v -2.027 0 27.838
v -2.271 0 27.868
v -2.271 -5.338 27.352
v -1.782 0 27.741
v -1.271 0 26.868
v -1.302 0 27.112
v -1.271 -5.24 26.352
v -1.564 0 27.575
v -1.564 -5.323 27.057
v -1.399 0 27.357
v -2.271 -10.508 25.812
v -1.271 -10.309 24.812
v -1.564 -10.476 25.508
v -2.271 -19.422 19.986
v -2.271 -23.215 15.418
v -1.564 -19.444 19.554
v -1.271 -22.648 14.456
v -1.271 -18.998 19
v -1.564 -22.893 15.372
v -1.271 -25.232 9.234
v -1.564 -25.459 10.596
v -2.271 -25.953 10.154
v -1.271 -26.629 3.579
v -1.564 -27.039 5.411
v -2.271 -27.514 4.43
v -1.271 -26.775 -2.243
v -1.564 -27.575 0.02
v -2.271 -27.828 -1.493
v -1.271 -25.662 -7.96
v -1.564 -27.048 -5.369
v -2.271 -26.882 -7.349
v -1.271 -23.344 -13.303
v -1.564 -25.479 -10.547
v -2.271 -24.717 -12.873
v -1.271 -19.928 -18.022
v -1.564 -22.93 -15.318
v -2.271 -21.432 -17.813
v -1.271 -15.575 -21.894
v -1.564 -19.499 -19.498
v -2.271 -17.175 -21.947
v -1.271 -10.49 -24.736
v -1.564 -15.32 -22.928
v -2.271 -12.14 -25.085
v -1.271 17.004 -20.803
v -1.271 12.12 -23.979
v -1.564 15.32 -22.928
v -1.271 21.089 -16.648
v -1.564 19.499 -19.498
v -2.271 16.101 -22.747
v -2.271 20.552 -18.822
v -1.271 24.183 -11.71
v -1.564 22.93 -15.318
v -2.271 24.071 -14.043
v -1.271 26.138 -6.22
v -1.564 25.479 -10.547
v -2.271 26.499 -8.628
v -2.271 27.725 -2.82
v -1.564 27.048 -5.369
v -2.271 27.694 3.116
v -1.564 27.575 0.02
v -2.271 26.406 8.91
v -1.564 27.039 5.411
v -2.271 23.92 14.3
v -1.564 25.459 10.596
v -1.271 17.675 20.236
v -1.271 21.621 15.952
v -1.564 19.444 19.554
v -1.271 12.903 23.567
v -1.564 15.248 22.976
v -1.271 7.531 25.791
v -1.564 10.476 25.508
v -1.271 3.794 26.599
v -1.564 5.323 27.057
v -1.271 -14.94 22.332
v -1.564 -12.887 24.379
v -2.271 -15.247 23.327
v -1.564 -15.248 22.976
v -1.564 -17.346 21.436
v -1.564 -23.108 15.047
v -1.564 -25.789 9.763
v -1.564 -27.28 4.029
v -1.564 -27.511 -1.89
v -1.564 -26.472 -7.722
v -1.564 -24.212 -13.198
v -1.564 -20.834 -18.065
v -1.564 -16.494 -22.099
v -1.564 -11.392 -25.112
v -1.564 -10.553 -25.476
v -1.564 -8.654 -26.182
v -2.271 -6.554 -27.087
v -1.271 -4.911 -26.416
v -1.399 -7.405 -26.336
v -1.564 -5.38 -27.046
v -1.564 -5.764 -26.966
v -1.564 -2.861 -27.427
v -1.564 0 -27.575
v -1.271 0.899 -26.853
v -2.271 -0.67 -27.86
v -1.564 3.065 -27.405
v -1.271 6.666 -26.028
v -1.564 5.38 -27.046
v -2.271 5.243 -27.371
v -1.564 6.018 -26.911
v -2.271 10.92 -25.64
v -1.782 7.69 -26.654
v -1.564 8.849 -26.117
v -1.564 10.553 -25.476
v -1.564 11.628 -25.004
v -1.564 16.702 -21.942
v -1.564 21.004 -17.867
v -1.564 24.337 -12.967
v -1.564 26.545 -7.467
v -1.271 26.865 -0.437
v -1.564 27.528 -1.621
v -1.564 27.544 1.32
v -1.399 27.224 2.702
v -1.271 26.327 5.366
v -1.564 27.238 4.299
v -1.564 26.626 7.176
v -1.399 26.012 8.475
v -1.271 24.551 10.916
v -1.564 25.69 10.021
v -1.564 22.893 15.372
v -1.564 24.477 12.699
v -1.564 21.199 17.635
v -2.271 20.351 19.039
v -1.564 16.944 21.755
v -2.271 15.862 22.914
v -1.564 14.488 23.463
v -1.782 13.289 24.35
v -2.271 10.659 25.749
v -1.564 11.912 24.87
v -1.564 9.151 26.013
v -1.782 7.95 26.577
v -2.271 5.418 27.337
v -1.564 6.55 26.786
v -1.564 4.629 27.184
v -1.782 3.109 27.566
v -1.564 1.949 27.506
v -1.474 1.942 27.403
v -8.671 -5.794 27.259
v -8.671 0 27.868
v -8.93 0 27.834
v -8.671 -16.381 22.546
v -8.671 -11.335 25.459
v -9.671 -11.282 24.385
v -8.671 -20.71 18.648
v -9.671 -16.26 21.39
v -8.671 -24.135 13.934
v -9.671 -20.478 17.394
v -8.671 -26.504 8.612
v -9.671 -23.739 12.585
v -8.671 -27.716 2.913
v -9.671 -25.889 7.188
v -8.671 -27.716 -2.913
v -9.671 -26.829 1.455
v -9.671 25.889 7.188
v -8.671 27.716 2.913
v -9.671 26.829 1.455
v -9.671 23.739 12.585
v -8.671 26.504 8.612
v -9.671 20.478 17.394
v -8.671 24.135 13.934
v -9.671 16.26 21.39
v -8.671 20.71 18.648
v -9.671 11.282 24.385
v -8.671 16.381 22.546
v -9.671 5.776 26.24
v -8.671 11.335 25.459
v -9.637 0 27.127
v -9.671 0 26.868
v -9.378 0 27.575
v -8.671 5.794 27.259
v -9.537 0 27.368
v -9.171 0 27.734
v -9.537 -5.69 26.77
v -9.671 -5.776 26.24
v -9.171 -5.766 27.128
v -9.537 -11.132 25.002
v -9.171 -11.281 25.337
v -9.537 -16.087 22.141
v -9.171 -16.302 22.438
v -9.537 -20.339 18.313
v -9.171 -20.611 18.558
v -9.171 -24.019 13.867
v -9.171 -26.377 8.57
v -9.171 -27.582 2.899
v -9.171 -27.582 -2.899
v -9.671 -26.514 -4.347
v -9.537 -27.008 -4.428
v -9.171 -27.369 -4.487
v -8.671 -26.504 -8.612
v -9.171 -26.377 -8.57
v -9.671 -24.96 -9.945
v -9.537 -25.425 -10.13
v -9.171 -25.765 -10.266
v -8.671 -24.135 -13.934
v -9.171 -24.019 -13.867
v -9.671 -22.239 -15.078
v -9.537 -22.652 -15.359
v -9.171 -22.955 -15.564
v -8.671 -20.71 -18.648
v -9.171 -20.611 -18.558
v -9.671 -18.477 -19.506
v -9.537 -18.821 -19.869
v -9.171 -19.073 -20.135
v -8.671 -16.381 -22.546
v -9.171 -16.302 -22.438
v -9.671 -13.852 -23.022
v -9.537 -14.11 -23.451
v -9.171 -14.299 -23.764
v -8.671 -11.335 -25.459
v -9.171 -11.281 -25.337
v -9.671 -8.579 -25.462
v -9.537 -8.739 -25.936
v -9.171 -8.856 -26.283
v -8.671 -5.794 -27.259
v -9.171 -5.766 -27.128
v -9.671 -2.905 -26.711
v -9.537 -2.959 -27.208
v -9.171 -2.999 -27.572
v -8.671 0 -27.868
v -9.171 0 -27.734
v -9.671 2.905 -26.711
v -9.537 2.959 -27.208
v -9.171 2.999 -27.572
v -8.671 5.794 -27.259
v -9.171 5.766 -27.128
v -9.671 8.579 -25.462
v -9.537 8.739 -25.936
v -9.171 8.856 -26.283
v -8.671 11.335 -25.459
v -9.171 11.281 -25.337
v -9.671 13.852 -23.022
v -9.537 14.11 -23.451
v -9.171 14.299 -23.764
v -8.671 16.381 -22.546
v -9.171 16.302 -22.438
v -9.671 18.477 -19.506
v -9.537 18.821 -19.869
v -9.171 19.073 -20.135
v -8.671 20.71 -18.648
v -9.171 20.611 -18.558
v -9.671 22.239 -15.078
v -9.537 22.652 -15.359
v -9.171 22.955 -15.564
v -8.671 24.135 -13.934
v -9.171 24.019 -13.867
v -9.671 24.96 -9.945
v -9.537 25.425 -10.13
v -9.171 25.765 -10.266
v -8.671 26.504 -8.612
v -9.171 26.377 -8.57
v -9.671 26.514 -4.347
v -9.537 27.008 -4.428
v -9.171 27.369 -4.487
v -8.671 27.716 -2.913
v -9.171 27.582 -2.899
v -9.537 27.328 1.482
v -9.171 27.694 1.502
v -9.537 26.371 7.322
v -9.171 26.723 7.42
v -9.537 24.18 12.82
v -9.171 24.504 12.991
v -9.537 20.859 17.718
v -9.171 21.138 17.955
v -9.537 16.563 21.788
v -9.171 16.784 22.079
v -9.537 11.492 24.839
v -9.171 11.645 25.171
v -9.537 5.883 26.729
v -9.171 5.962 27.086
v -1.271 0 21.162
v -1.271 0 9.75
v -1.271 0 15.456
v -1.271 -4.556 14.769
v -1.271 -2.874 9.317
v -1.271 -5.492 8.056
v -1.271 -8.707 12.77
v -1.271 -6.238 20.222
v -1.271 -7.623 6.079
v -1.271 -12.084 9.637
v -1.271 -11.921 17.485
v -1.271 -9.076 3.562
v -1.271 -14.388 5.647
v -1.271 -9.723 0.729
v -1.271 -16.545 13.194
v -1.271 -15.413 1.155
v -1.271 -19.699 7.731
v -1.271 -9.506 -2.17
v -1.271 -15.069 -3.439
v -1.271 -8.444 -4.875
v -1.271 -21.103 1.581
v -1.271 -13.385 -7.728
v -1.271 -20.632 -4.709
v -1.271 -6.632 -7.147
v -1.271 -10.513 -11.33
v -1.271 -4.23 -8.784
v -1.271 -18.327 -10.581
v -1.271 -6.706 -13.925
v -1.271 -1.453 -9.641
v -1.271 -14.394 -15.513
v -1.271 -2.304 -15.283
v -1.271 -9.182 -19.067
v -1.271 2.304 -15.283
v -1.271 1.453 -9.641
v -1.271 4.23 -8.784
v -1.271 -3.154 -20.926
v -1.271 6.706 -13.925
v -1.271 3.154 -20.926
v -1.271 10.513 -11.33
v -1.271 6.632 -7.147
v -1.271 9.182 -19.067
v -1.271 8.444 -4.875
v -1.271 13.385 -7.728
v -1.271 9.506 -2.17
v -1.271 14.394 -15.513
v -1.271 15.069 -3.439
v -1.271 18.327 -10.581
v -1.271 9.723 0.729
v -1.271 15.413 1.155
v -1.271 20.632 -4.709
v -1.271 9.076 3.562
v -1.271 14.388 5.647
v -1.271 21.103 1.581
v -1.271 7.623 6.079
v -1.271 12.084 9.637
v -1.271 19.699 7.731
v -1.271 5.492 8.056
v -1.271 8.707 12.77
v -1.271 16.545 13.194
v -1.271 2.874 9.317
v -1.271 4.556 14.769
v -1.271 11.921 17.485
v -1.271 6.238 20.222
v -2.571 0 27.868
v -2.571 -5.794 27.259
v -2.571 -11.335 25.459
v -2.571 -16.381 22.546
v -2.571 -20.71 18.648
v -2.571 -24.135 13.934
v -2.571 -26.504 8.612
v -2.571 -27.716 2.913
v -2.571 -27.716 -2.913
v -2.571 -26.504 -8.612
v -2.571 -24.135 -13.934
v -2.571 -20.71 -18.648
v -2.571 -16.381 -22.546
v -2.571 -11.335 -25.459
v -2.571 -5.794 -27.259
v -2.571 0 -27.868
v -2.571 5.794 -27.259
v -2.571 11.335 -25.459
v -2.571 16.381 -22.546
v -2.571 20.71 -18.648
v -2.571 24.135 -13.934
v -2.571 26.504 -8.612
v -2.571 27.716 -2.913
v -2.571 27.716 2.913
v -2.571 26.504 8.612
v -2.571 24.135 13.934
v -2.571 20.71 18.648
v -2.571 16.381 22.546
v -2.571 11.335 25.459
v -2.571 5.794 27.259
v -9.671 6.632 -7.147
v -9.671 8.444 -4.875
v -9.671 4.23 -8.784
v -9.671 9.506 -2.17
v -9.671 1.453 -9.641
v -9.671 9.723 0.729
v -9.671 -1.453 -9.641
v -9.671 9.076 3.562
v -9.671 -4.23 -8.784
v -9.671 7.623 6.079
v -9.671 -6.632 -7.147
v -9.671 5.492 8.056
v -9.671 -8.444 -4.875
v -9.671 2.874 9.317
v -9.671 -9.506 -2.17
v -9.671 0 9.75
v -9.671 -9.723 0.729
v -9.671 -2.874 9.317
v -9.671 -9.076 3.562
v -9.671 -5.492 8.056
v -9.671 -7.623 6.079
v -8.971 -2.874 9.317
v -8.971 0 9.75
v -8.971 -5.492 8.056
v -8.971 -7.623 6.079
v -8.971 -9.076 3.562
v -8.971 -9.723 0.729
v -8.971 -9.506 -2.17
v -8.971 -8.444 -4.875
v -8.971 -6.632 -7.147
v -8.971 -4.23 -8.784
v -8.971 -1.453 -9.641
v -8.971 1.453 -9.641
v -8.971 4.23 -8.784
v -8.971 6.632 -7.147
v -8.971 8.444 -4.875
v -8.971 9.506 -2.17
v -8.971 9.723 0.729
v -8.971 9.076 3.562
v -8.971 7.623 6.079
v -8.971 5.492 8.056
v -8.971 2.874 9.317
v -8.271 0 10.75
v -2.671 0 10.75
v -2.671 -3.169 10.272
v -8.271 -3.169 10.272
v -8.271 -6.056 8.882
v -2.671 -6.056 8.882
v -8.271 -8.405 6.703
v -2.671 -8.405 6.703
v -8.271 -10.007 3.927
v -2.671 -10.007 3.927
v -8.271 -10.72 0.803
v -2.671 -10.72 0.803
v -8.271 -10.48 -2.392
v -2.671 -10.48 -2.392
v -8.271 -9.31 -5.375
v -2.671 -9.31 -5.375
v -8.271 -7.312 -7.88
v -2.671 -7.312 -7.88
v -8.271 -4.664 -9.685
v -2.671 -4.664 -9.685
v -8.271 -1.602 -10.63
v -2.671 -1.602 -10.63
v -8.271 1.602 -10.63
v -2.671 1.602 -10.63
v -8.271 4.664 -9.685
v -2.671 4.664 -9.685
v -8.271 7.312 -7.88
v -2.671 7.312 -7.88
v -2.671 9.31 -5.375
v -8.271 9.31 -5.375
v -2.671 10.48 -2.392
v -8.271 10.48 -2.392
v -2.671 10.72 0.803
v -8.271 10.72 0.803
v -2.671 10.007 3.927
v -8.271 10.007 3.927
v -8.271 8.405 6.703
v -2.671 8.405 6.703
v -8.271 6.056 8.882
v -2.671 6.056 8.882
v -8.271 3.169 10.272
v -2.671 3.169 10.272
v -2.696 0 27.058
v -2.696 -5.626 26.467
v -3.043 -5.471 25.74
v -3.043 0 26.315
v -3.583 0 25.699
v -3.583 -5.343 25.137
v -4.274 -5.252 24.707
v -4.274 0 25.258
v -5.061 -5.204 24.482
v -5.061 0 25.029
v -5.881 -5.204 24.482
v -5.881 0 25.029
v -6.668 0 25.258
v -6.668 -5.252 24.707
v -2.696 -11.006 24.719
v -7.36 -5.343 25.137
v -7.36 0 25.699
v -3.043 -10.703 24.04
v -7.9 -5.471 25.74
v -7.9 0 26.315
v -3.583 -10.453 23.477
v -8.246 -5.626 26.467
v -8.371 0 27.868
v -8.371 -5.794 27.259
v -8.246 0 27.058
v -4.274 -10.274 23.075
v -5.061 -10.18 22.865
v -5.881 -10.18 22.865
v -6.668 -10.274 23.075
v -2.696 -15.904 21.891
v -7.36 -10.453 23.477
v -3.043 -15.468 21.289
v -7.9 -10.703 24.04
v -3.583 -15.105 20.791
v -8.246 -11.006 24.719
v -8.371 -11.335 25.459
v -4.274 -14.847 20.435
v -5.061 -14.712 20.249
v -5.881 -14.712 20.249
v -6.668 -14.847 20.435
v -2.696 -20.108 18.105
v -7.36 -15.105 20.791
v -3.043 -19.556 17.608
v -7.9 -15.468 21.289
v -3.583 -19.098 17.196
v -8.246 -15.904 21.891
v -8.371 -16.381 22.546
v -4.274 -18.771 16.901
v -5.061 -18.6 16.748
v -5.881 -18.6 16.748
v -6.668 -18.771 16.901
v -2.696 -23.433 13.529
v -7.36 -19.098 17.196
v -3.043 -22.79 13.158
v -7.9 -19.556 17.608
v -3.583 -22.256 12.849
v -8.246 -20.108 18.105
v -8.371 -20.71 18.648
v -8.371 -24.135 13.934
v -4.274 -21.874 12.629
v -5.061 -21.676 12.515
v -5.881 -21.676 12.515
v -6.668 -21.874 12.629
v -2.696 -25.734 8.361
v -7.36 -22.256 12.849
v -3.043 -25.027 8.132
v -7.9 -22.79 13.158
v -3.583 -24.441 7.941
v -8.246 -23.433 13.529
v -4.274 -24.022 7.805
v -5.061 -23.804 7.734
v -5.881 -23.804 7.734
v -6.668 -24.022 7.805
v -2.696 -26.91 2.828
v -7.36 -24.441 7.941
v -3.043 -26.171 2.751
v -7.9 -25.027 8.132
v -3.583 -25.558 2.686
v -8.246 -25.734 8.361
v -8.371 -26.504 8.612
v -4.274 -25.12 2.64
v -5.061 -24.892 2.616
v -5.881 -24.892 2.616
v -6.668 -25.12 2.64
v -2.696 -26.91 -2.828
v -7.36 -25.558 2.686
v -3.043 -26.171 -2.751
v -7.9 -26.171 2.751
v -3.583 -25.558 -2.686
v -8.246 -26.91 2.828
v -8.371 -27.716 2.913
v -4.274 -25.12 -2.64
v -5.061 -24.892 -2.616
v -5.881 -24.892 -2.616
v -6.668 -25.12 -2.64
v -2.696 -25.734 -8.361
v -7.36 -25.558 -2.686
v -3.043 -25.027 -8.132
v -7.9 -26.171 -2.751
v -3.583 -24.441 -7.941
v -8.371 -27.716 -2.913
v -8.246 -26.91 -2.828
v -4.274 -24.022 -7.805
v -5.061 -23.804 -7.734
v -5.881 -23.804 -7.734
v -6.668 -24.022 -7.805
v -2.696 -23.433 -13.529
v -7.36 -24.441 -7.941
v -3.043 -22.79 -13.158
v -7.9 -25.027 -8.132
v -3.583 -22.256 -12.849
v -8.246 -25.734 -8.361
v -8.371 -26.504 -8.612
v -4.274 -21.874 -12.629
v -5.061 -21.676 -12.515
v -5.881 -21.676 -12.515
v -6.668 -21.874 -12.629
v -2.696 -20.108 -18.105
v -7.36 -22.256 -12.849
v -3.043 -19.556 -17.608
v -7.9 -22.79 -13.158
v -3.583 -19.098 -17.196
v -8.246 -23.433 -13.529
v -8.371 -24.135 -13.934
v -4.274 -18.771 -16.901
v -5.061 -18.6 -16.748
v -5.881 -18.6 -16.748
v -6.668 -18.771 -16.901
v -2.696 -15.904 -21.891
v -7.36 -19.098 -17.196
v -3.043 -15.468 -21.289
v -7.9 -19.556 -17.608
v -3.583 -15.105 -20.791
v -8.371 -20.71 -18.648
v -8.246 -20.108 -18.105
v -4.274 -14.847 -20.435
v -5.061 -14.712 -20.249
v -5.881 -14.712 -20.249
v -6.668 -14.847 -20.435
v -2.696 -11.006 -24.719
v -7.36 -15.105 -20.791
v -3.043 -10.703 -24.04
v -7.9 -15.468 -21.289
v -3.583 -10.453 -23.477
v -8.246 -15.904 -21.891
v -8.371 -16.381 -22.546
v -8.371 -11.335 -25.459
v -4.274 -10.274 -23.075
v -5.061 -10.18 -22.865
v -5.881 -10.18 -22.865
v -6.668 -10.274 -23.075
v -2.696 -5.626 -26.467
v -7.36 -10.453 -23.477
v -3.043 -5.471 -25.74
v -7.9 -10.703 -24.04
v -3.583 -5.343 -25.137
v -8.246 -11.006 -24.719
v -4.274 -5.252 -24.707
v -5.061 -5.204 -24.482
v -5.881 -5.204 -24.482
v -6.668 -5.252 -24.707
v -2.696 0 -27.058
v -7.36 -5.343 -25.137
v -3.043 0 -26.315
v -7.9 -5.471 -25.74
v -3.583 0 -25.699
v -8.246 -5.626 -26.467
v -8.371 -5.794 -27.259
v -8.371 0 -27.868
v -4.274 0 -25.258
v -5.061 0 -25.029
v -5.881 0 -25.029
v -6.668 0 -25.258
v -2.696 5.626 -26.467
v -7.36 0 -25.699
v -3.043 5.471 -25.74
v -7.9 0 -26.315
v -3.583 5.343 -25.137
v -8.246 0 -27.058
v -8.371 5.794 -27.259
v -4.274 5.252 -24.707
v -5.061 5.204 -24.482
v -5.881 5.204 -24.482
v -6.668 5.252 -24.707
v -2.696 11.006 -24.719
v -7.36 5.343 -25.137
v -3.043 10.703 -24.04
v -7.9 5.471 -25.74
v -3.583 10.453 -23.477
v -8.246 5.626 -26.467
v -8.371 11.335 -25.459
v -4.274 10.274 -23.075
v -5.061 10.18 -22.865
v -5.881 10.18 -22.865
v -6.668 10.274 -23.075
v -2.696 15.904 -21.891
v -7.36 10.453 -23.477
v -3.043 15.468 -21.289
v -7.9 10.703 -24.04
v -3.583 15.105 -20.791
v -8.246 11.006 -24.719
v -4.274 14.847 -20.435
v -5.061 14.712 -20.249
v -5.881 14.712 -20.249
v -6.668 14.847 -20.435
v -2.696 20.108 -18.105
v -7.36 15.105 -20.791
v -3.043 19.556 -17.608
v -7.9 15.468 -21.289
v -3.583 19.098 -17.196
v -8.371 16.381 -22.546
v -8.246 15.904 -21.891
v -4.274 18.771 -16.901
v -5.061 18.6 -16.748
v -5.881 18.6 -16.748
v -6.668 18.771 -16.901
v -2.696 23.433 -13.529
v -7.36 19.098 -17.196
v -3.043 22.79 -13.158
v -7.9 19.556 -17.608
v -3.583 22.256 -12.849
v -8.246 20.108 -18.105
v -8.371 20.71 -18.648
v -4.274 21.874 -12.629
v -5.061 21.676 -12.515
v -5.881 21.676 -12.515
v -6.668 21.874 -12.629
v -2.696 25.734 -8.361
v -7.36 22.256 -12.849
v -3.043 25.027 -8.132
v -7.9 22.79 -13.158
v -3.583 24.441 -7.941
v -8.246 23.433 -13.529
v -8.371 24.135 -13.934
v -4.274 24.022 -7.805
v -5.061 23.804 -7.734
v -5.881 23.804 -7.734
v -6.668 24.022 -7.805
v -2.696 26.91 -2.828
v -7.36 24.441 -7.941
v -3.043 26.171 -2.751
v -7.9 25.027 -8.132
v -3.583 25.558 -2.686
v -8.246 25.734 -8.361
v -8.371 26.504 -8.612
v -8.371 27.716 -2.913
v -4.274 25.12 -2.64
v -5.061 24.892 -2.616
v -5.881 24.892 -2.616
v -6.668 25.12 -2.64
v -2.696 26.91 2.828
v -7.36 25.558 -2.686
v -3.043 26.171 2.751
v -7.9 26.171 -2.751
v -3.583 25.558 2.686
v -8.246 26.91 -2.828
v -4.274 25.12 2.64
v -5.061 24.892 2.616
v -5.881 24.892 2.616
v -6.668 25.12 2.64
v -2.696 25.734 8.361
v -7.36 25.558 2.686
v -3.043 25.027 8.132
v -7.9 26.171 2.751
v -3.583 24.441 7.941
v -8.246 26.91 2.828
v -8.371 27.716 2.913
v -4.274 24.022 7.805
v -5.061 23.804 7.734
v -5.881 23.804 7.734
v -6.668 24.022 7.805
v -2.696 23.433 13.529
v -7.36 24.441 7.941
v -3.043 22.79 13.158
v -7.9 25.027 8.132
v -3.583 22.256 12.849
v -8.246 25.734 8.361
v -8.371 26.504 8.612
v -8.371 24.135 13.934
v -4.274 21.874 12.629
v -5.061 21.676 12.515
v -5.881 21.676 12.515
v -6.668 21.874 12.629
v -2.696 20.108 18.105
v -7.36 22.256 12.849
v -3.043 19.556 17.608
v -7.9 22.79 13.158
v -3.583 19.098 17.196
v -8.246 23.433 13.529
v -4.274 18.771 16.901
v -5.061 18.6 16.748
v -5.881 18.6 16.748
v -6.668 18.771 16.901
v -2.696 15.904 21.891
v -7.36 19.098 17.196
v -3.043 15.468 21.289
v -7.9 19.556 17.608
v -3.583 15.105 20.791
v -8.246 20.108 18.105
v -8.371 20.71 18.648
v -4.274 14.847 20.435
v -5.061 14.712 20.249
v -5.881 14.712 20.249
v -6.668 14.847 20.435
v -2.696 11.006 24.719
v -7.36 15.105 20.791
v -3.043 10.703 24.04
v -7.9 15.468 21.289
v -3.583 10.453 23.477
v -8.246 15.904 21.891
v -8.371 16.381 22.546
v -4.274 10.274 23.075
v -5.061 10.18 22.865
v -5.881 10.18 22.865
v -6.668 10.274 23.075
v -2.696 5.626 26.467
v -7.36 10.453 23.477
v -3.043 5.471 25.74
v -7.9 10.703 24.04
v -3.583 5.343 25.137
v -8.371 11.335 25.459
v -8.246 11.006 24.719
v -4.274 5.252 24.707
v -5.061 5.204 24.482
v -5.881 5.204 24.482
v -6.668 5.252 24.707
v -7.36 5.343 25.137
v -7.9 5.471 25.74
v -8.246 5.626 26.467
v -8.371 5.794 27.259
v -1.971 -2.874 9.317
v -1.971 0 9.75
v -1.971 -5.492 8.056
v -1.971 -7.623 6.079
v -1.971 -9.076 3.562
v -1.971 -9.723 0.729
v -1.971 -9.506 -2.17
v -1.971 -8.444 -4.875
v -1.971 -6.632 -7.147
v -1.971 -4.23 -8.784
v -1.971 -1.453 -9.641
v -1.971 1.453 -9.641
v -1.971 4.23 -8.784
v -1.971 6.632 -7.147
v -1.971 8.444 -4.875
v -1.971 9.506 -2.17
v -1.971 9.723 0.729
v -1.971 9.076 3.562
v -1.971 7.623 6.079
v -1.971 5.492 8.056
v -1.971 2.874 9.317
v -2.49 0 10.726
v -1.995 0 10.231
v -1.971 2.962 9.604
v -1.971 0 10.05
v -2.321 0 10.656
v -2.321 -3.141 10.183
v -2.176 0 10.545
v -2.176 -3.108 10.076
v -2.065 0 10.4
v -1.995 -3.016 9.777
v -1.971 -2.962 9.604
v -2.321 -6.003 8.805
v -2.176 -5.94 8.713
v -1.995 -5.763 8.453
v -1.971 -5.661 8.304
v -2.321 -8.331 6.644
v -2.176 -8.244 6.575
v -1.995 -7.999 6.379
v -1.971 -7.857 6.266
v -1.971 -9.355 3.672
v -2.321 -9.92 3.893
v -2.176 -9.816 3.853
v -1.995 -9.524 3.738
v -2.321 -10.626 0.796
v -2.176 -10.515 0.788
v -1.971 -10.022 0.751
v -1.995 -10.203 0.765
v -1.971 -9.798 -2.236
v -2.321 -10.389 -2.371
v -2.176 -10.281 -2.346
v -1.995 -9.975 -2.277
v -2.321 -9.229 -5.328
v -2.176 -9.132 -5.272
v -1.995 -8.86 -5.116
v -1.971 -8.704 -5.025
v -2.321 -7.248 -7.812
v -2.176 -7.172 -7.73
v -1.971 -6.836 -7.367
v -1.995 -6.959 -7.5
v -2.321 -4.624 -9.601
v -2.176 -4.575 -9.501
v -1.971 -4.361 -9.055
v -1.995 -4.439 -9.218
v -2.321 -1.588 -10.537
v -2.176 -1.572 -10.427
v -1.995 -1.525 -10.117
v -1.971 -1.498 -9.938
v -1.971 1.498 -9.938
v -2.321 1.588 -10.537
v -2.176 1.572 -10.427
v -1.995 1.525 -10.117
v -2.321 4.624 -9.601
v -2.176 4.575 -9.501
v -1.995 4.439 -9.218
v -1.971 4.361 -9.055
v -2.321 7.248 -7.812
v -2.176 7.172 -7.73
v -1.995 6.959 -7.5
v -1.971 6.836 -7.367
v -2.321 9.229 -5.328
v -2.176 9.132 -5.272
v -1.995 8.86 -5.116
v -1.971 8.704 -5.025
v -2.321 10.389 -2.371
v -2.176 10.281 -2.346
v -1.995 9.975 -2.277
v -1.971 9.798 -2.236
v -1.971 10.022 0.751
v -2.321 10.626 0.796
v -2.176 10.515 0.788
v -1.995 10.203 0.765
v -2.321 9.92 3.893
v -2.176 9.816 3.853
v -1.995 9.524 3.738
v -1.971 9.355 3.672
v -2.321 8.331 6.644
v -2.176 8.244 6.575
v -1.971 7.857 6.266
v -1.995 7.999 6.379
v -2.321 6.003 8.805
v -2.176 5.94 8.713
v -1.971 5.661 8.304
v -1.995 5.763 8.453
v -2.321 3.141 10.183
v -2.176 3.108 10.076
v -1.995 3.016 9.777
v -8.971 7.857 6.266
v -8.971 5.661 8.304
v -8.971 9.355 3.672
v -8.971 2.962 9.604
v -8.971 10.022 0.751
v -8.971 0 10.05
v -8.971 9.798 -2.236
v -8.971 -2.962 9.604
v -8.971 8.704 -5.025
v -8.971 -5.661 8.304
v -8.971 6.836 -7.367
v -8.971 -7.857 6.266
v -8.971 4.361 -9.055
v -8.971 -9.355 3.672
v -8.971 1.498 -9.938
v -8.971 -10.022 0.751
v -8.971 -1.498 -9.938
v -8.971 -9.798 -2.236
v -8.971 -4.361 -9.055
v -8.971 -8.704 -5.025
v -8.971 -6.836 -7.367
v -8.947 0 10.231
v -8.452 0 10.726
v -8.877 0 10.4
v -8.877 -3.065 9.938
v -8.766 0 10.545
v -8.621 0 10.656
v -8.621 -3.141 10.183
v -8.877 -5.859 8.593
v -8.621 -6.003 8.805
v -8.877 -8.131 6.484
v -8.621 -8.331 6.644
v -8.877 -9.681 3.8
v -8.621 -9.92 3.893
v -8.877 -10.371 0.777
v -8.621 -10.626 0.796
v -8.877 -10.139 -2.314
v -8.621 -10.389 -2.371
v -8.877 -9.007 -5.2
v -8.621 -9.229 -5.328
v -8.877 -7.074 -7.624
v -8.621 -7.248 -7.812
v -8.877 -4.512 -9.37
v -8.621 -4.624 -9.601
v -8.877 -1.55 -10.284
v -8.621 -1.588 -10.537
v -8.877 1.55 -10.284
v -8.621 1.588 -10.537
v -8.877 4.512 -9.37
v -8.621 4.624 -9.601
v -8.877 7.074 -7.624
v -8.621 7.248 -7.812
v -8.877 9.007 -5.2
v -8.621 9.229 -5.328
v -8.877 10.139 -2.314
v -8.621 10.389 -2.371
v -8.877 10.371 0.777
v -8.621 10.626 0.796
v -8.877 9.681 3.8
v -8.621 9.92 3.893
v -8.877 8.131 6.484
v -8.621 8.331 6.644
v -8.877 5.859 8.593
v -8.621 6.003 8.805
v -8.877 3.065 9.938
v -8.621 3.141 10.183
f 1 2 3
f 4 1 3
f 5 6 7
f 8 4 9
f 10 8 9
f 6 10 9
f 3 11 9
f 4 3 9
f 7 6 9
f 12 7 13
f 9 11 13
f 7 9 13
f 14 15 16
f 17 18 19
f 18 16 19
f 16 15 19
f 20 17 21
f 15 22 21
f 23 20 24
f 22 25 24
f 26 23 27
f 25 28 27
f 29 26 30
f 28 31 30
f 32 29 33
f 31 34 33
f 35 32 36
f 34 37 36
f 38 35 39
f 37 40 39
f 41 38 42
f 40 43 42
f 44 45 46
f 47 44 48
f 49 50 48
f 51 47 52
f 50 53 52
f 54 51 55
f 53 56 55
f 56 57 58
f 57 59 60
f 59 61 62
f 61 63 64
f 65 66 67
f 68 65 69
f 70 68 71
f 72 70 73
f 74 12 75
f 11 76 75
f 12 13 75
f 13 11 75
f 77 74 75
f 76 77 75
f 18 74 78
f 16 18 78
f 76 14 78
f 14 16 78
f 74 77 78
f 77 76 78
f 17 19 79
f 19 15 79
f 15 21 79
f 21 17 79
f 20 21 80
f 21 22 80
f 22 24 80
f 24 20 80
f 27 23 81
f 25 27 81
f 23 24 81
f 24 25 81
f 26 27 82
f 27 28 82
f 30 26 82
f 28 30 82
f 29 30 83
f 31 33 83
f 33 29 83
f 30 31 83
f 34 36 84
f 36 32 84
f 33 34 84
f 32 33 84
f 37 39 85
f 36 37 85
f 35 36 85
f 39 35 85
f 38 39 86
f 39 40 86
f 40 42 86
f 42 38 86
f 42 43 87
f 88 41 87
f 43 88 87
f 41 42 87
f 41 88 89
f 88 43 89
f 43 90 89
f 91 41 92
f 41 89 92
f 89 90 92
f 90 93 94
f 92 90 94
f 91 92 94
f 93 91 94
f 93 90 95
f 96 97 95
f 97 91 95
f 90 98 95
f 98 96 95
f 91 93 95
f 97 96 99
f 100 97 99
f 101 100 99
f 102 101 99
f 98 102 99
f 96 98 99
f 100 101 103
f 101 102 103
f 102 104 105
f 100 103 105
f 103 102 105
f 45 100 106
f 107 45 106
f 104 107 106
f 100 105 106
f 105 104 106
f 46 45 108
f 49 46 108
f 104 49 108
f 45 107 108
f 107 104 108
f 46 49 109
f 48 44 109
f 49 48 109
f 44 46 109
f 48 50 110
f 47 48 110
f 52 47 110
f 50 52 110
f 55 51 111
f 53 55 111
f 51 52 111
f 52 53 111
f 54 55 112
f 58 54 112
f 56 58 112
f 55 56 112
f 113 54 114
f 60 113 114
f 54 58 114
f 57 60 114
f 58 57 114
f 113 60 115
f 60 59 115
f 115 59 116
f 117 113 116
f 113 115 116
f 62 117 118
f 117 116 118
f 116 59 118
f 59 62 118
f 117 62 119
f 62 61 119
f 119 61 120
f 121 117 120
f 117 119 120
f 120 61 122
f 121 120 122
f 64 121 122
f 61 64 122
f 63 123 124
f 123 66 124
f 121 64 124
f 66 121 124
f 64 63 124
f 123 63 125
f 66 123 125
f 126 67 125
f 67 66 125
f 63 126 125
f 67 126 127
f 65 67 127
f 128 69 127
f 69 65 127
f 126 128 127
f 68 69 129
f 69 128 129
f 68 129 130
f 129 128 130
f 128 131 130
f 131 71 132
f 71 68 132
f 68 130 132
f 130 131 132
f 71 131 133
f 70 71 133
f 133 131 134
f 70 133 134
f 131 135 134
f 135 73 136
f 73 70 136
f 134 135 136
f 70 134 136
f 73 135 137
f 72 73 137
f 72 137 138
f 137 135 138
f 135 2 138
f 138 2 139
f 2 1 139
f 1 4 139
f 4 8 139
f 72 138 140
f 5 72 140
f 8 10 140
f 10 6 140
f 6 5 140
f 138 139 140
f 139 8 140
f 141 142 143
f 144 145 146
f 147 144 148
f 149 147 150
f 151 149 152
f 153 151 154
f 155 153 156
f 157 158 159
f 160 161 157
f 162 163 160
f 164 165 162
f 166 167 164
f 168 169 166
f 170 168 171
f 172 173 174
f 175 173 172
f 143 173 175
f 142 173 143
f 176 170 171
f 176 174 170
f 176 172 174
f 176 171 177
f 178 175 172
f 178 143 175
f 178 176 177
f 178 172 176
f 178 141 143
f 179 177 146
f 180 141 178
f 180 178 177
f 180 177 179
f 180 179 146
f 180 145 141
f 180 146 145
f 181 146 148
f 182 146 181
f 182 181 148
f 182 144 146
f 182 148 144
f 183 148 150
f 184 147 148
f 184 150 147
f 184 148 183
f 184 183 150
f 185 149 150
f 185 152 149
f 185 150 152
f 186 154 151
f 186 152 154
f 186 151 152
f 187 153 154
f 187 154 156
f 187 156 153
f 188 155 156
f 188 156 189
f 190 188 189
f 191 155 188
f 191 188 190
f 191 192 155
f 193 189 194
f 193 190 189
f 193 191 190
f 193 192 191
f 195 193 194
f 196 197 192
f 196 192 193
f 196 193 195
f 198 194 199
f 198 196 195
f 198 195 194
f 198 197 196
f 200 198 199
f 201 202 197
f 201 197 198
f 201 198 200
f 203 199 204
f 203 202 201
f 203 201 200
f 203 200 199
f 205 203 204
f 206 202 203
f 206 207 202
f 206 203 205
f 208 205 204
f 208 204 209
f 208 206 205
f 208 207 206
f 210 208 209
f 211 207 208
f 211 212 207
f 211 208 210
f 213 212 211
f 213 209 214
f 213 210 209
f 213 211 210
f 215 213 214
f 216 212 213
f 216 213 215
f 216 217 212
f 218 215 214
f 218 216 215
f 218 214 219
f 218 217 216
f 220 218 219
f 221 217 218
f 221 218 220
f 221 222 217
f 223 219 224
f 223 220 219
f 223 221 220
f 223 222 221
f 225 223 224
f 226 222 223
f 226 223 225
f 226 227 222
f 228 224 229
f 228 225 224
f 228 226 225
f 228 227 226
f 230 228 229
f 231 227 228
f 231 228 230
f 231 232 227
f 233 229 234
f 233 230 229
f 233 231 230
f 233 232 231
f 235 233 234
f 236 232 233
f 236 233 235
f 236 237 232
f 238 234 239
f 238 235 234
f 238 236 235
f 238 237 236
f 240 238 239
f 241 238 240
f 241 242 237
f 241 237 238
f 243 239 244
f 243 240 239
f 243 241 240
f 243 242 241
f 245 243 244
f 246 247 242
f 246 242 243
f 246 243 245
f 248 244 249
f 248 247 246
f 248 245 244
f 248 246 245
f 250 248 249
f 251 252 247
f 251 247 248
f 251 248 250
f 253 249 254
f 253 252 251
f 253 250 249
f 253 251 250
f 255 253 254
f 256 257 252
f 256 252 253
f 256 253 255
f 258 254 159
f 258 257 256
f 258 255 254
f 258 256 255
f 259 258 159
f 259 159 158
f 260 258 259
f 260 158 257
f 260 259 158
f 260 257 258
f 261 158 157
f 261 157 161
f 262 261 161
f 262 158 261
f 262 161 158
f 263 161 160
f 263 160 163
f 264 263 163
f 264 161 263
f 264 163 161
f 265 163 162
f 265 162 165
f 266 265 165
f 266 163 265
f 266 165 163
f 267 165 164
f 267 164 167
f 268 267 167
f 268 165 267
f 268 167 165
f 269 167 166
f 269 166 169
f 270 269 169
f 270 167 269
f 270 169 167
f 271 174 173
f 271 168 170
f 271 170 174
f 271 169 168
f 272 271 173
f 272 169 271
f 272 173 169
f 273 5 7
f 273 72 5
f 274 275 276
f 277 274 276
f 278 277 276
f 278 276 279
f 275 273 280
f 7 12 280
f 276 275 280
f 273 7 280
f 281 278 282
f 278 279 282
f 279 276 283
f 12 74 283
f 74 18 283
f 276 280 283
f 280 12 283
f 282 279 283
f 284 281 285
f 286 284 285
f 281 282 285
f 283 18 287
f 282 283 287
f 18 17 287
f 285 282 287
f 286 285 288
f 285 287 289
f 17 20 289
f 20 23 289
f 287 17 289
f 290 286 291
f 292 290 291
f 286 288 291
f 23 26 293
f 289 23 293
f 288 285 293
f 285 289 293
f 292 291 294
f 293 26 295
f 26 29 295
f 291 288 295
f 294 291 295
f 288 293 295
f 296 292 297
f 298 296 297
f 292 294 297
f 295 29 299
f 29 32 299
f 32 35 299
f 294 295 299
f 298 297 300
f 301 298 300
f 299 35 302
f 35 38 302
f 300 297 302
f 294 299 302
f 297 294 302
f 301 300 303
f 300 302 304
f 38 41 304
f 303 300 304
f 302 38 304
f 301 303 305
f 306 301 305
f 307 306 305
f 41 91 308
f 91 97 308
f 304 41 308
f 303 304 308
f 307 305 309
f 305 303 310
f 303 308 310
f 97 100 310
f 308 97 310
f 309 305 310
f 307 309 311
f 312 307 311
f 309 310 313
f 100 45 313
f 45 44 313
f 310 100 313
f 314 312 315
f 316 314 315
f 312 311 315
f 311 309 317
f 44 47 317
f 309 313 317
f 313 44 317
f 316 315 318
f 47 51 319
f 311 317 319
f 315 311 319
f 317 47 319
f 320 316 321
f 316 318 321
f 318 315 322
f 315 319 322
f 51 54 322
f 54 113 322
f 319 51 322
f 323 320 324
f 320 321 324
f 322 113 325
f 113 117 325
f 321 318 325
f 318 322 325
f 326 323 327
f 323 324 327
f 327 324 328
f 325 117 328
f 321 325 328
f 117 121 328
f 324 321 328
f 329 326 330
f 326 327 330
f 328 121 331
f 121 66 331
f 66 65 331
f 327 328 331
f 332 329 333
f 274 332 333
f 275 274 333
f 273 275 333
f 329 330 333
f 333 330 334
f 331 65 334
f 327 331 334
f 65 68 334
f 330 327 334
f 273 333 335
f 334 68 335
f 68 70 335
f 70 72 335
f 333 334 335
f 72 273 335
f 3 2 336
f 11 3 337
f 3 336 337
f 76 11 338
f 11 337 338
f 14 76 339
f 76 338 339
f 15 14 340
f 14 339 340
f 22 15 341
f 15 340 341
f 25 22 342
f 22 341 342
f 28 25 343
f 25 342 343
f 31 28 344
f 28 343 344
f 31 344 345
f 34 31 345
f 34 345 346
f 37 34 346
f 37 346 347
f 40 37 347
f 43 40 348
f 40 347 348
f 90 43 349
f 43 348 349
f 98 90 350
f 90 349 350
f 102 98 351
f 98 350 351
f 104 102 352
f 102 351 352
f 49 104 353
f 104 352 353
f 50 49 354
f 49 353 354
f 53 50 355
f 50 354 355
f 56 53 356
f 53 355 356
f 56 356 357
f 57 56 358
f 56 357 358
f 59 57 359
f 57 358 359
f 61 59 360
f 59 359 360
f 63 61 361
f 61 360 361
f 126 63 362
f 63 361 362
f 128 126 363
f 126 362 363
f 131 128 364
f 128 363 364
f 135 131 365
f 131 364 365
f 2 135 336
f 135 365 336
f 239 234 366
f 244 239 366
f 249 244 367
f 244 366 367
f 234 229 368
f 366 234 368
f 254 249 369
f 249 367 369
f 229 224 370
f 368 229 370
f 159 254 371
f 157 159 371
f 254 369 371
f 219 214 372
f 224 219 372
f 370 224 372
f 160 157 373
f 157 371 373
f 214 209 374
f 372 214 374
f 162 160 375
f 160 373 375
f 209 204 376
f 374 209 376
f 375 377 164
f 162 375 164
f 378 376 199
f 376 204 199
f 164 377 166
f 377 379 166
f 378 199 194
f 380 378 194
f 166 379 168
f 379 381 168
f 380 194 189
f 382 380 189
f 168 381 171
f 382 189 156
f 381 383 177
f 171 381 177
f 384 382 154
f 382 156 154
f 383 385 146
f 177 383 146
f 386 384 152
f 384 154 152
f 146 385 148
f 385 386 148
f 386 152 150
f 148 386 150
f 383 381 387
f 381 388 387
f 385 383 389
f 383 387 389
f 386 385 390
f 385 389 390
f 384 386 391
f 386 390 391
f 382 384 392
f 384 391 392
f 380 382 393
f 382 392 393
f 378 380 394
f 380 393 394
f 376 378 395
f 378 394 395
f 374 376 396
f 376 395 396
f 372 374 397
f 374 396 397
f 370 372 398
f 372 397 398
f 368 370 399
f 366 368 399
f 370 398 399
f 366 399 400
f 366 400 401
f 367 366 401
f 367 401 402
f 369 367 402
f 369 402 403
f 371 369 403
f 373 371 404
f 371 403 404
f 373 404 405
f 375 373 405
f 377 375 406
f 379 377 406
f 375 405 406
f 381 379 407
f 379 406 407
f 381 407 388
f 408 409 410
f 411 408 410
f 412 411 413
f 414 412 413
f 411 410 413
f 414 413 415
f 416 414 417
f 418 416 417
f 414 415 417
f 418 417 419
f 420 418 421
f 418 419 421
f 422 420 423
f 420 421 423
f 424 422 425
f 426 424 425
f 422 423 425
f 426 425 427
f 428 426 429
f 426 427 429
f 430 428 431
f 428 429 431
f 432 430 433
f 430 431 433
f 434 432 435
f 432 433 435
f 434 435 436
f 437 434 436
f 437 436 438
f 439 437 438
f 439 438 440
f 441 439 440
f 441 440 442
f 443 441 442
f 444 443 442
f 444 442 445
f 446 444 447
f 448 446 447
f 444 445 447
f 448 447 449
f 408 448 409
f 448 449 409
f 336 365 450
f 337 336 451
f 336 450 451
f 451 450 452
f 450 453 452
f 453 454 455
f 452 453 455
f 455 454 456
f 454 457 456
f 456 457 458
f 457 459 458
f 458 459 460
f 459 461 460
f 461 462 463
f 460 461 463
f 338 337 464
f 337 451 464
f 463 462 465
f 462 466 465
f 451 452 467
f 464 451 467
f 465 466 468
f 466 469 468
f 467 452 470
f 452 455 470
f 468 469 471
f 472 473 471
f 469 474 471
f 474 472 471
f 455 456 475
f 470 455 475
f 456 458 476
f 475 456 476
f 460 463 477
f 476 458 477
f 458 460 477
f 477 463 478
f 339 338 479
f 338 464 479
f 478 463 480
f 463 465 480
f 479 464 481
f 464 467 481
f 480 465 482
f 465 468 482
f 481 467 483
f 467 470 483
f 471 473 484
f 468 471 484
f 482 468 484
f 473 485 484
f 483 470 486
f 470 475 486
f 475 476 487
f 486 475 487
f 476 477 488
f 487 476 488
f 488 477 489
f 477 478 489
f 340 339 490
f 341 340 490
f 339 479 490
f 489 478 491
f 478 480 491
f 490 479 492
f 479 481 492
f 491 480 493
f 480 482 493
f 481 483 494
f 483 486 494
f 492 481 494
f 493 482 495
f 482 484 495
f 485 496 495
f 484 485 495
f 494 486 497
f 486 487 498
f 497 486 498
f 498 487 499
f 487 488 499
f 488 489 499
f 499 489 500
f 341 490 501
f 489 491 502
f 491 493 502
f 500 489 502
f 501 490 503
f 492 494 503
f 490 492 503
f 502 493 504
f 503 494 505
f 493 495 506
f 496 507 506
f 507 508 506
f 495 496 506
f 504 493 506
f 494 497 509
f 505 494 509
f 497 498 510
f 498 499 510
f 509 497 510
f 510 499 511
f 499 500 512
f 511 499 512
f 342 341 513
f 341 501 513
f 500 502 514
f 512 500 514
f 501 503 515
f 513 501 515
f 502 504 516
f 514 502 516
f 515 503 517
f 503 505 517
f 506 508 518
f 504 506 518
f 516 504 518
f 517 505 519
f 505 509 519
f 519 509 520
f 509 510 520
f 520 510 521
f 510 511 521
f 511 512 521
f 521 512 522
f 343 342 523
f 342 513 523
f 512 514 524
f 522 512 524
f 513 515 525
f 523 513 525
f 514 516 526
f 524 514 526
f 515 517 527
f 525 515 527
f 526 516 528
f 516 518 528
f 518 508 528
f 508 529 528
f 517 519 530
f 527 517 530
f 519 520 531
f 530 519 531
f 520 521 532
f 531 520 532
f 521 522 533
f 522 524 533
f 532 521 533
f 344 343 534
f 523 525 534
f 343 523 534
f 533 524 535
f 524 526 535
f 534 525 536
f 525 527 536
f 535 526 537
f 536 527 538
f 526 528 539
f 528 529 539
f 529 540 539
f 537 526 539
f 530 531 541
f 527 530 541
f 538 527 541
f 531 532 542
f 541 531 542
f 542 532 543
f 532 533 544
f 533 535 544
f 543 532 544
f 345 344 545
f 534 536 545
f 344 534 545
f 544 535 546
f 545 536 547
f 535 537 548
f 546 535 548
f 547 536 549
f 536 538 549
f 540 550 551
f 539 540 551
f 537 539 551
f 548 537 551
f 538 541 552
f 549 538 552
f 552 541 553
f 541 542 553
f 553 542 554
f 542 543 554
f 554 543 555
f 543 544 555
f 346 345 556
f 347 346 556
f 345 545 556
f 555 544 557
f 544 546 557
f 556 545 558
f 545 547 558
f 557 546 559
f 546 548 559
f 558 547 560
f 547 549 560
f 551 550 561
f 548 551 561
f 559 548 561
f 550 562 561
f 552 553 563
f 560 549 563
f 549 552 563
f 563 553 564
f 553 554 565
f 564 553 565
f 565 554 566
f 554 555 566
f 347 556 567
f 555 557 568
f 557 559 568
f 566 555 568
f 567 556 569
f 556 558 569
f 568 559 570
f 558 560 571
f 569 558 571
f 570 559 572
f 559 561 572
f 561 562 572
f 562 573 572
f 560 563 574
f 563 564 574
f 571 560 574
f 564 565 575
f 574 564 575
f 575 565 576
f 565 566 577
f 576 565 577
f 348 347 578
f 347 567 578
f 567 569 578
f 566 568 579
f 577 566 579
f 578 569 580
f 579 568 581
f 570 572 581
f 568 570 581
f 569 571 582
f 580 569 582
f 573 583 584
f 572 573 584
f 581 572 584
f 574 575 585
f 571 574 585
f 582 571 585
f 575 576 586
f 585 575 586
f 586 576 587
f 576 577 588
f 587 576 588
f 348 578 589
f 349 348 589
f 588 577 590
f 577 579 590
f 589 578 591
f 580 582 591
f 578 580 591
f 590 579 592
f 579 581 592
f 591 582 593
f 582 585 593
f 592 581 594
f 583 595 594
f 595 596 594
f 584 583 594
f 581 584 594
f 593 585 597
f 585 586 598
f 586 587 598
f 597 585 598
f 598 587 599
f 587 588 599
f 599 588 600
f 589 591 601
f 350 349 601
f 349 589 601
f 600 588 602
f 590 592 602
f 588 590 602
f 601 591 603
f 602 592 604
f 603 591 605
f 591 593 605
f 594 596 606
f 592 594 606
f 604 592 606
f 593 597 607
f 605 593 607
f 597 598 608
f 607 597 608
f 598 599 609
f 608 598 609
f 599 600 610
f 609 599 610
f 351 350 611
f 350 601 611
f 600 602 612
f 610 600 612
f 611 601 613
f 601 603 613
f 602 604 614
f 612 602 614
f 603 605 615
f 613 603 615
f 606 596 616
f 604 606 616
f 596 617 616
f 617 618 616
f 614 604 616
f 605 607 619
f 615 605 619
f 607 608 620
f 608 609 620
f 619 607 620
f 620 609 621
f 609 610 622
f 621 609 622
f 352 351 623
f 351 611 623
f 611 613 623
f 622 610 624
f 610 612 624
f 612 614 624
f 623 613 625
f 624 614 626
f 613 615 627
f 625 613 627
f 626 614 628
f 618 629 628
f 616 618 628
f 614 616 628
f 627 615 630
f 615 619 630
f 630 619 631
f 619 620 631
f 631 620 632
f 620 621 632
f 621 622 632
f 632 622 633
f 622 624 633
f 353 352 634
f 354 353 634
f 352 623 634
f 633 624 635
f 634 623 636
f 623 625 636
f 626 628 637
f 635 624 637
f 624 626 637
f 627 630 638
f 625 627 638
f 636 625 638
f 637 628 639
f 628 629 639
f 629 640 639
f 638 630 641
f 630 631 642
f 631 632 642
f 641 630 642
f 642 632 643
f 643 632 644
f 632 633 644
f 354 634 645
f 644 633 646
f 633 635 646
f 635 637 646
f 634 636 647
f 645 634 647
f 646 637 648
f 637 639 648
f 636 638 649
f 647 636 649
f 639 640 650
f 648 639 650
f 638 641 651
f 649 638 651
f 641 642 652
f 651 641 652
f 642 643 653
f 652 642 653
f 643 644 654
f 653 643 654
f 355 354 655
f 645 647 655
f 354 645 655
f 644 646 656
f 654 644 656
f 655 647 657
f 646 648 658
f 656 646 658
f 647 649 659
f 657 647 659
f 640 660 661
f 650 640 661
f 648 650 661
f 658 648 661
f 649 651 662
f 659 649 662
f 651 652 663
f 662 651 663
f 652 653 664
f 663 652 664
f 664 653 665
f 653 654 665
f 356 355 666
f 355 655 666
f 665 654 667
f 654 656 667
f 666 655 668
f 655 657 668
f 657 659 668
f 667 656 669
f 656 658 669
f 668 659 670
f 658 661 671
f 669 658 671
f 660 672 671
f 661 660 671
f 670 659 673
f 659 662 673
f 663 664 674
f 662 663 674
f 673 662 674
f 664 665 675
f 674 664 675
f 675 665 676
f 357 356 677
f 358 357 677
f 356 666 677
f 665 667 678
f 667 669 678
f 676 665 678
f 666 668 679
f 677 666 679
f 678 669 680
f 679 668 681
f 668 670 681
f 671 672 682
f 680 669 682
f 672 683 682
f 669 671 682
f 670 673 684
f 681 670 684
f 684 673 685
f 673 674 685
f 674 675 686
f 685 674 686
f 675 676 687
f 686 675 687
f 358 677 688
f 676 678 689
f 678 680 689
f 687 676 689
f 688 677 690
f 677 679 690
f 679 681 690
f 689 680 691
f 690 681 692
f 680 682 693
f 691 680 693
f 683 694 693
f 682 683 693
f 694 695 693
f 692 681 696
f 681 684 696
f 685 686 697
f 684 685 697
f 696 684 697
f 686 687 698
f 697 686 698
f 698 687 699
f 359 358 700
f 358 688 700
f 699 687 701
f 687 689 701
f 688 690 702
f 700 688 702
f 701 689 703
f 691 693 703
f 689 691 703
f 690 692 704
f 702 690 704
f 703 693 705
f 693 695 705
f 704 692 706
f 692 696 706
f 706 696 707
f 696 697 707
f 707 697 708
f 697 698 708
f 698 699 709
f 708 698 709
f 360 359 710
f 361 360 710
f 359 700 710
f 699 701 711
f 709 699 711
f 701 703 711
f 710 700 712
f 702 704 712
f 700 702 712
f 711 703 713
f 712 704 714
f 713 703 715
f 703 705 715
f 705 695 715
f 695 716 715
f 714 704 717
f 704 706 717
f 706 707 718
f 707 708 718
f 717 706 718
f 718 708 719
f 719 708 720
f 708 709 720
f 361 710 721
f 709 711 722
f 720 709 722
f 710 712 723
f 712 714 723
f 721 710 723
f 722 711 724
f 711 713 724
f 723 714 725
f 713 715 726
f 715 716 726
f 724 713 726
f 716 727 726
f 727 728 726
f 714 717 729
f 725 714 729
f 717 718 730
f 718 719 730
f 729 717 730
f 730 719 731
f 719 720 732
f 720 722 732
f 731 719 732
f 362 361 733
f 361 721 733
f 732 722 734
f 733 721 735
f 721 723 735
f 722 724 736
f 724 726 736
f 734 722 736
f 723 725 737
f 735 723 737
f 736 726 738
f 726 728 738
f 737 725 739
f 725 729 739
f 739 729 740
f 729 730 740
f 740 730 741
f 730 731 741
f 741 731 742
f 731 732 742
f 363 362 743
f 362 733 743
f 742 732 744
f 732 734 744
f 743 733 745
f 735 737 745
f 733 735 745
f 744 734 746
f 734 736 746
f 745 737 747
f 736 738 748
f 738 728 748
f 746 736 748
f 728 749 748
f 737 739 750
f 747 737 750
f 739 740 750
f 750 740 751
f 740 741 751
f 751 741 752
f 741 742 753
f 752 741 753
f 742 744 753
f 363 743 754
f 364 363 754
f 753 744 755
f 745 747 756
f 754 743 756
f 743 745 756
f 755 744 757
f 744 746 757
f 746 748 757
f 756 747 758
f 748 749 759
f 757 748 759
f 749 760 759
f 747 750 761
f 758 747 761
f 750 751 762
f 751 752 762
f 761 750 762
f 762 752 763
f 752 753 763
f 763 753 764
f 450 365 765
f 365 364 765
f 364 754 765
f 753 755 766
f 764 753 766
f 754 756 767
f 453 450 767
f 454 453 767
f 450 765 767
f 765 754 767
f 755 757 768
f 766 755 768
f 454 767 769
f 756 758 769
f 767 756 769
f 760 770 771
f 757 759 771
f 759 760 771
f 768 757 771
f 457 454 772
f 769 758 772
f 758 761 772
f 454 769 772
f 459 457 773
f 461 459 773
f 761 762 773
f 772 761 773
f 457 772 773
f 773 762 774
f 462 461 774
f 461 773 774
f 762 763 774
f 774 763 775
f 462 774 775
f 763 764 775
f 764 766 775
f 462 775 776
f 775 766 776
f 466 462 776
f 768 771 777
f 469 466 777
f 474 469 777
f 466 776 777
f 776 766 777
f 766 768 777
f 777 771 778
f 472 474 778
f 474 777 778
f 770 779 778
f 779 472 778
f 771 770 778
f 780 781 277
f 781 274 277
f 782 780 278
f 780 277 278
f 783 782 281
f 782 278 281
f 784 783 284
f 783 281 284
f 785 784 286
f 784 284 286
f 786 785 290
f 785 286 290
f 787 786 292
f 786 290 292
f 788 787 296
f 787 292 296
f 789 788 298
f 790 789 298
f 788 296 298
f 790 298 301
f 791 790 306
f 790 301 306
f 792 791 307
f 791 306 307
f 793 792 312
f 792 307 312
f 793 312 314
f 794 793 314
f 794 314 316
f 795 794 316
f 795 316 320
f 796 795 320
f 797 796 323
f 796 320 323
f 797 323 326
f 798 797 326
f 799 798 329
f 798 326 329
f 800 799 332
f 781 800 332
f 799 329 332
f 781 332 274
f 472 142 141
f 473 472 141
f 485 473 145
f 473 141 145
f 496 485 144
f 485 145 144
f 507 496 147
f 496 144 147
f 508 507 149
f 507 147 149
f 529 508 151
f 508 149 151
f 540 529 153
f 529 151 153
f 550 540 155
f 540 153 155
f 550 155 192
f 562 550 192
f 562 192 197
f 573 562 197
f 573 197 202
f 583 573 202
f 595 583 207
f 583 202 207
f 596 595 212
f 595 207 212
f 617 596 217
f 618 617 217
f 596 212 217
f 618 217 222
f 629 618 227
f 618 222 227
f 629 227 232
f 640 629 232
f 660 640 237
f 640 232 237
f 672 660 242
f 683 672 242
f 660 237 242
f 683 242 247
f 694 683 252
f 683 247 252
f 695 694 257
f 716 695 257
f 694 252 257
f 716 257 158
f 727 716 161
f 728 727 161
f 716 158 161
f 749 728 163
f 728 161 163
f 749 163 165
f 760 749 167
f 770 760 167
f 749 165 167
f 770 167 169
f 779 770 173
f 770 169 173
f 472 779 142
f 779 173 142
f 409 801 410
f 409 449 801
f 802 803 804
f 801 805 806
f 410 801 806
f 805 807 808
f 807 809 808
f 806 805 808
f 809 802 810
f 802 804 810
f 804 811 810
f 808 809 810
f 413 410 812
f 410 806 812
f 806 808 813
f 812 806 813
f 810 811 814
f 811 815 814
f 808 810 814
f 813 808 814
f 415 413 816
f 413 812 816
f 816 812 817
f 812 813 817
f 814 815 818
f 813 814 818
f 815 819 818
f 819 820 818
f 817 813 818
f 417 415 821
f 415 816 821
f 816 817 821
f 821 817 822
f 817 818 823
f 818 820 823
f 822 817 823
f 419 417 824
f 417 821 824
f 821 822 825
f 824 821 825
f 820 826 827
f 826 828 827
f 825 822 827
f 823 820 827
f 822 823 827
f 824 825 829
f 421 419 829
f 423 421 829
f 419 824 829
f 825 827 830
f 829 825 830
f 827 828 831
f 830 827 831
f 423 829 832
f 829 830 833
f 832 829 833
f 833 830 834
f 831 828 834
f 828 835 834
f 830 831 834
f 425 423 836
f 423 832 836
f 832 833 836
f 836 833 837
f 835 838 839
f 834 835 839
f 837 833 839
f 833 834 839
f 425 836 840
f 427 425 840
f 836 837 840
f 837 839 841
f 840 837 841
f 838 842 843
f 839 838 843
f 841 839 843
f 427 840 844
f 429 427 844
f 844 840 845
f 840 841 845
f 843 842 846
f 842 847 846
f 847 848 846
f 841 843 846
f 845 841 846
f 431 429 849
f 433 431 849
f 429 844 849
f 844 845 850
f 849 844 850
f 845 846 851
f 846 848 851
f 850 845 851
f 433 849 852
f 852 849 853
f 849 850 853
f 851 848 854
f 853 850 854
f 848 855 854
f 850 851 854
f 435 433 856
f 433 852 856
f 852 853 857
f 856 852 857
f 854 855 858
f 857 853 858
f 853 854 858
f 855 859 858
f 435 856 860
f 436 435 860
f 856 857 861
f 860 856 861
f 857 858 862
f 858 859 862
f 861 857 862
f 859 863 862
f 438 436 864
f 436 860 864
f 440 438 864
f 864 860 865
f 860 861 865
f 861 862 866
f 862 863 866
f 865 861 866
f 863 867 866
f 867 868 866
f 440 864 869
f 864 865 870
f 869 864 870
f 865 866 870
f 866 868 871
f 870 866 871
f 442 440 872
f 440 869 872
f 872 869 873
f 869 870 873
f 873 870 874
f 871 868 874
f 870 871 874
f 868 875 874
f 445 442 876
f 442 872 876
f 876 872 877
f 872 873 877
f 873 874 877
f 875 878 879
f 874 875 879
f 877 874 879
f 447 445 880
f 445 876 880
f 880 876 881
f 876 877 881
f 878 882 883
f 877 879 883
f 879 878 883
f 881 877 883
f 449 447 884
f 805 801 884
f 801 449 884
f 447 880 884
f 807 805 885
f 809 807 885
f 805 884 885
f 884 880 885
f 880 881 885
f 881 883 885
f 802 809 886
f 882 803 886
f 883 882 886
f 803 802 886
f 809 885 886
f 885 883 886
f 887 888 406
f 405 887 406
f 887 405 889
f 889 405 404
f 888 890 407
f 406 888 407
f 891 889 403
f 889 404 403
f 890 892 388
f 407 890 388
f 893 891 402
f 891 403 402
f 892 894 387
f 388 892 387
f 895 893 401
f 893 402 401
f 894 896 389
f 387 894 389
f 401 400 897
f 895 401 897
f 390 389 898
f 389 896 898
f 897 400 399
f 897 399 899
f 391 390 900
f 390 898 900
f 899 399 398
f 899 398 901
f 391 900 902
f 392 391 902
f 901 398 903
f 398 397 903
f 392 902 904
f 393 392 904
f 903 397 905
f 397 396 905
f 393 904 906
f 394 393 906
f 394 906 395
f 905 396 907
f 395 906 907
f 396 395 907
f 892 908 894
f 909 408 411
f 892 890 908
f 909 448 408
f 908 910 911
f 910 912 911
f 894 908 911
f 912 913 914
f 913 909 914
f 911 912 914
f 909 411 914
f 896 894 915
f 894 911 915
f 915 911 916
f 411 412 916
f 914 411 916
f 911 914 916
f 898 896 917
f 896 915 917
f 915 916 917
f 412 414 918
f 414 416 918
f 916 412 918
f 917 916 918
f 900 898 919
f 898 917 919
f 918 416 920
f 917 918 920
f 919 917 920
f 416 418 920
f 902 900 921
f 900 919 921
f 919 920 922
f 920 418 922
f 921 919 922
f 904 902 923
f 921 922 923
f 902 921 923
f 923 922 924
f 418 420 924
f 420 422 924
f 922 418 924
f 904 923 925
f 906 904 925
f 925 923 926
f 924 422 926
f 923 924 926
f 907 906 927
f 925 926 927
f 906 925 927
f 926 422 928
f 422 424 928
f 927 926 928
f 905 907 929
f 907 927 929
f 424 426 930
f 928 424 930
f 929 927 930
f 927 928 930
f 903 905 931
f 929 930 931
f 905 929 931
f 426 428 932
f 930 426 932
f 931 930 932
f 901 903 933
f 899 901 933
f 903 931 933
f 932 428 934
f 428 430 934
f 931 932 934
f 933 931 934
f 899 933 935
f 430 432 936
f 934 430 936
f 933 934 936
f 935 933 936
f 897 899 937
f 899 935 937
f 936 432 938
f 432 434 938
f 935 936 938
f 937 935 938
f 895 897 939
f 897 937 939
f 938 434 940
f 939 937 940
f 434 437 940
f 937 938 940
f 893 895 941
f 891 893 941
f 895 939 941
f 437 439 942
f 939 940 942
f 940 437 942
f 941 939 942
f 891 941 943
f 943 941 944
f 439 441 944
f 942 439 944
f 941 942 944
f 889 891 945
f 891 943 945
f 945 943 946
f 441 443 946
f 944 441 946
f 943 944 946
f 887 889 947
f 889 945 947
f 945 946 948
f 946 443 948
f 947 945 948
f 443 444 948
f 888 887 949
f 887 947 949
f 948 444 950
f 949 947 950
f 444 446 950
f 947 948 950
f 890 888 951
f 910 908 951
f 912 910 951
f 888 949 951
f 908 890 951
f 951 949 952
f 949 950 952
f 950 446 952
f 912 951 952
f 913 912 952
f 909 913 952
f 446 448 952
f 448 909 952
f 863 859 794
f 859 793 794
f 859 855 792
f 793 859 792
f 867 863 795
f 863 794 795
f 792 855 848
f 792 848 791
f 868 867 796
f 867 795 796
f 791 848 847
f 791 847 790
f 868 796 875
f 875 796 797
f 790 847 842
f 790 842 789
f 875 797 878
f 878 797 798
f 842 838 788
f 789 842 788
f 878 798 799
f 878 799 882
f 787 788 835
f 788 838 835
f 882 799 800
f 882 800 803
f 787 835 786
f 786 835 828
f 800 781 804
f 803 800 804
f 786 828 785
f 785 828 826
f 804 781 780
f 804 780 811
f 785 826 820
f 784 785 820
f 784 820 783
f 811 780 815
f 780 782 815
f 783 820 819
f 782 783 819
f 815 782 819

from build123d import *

# Parameters (mm, degrees)
F2_R = 0.7
F3_R = 1


with BuildPart() as f1:
    # F0 (on Front) → F1 (revolve)
    with BuildSketch(Plane.XZ):
        with BuildLine():
            Line((-8.371151, 27.86837), (-9.671151, 27.86837))
            Line((-9.671151, 27.86837), (-9.671151, 9.75))
            Line((-9.671151, 9.75), (-8.971151, 9.75))
            Line((-8.971151, 9.75), (-8.971151, 10.75))
            Line((-8.971151, 10.75), (-1.971151, 10.75))
            Line((-1.971151, 10.75), (-1.971151, 9.75))
            Line((-1.971151, 9.75), (-1.271151, 9.75))
            Line((-1.271151, 9.75), (-1.271496, 27.86837))
            Line((-1.271496, 27.86837), (-2.571496, 27.86837))
            ThreePointArc((-2.571496, 27.86837), (-5.471323, 25), (-8.371151, 27.86837))
        make_face()
    revolve(axis=Axis((-1.891199, 0, 0), (1, 0, 0)))

    # F2
    f2_edges = [f1.edges().sort_by_distance(p)[0] for p in [
        (-8.971151, 0, -10.75),
        (-1.971151, 0, -10.75),
    ]]
    fillet(f2_edges, radius=F2_R)

    # F3
    f3_edges = [f1.edges().sort_by_distance(p)[0] for p in [
        (-9.671151, 0, -27.86837),
        (-1.271496, 0, -27.86837),
    ]]
    fillet(f3_edges, radius=F3_R)


solid = f1.part
